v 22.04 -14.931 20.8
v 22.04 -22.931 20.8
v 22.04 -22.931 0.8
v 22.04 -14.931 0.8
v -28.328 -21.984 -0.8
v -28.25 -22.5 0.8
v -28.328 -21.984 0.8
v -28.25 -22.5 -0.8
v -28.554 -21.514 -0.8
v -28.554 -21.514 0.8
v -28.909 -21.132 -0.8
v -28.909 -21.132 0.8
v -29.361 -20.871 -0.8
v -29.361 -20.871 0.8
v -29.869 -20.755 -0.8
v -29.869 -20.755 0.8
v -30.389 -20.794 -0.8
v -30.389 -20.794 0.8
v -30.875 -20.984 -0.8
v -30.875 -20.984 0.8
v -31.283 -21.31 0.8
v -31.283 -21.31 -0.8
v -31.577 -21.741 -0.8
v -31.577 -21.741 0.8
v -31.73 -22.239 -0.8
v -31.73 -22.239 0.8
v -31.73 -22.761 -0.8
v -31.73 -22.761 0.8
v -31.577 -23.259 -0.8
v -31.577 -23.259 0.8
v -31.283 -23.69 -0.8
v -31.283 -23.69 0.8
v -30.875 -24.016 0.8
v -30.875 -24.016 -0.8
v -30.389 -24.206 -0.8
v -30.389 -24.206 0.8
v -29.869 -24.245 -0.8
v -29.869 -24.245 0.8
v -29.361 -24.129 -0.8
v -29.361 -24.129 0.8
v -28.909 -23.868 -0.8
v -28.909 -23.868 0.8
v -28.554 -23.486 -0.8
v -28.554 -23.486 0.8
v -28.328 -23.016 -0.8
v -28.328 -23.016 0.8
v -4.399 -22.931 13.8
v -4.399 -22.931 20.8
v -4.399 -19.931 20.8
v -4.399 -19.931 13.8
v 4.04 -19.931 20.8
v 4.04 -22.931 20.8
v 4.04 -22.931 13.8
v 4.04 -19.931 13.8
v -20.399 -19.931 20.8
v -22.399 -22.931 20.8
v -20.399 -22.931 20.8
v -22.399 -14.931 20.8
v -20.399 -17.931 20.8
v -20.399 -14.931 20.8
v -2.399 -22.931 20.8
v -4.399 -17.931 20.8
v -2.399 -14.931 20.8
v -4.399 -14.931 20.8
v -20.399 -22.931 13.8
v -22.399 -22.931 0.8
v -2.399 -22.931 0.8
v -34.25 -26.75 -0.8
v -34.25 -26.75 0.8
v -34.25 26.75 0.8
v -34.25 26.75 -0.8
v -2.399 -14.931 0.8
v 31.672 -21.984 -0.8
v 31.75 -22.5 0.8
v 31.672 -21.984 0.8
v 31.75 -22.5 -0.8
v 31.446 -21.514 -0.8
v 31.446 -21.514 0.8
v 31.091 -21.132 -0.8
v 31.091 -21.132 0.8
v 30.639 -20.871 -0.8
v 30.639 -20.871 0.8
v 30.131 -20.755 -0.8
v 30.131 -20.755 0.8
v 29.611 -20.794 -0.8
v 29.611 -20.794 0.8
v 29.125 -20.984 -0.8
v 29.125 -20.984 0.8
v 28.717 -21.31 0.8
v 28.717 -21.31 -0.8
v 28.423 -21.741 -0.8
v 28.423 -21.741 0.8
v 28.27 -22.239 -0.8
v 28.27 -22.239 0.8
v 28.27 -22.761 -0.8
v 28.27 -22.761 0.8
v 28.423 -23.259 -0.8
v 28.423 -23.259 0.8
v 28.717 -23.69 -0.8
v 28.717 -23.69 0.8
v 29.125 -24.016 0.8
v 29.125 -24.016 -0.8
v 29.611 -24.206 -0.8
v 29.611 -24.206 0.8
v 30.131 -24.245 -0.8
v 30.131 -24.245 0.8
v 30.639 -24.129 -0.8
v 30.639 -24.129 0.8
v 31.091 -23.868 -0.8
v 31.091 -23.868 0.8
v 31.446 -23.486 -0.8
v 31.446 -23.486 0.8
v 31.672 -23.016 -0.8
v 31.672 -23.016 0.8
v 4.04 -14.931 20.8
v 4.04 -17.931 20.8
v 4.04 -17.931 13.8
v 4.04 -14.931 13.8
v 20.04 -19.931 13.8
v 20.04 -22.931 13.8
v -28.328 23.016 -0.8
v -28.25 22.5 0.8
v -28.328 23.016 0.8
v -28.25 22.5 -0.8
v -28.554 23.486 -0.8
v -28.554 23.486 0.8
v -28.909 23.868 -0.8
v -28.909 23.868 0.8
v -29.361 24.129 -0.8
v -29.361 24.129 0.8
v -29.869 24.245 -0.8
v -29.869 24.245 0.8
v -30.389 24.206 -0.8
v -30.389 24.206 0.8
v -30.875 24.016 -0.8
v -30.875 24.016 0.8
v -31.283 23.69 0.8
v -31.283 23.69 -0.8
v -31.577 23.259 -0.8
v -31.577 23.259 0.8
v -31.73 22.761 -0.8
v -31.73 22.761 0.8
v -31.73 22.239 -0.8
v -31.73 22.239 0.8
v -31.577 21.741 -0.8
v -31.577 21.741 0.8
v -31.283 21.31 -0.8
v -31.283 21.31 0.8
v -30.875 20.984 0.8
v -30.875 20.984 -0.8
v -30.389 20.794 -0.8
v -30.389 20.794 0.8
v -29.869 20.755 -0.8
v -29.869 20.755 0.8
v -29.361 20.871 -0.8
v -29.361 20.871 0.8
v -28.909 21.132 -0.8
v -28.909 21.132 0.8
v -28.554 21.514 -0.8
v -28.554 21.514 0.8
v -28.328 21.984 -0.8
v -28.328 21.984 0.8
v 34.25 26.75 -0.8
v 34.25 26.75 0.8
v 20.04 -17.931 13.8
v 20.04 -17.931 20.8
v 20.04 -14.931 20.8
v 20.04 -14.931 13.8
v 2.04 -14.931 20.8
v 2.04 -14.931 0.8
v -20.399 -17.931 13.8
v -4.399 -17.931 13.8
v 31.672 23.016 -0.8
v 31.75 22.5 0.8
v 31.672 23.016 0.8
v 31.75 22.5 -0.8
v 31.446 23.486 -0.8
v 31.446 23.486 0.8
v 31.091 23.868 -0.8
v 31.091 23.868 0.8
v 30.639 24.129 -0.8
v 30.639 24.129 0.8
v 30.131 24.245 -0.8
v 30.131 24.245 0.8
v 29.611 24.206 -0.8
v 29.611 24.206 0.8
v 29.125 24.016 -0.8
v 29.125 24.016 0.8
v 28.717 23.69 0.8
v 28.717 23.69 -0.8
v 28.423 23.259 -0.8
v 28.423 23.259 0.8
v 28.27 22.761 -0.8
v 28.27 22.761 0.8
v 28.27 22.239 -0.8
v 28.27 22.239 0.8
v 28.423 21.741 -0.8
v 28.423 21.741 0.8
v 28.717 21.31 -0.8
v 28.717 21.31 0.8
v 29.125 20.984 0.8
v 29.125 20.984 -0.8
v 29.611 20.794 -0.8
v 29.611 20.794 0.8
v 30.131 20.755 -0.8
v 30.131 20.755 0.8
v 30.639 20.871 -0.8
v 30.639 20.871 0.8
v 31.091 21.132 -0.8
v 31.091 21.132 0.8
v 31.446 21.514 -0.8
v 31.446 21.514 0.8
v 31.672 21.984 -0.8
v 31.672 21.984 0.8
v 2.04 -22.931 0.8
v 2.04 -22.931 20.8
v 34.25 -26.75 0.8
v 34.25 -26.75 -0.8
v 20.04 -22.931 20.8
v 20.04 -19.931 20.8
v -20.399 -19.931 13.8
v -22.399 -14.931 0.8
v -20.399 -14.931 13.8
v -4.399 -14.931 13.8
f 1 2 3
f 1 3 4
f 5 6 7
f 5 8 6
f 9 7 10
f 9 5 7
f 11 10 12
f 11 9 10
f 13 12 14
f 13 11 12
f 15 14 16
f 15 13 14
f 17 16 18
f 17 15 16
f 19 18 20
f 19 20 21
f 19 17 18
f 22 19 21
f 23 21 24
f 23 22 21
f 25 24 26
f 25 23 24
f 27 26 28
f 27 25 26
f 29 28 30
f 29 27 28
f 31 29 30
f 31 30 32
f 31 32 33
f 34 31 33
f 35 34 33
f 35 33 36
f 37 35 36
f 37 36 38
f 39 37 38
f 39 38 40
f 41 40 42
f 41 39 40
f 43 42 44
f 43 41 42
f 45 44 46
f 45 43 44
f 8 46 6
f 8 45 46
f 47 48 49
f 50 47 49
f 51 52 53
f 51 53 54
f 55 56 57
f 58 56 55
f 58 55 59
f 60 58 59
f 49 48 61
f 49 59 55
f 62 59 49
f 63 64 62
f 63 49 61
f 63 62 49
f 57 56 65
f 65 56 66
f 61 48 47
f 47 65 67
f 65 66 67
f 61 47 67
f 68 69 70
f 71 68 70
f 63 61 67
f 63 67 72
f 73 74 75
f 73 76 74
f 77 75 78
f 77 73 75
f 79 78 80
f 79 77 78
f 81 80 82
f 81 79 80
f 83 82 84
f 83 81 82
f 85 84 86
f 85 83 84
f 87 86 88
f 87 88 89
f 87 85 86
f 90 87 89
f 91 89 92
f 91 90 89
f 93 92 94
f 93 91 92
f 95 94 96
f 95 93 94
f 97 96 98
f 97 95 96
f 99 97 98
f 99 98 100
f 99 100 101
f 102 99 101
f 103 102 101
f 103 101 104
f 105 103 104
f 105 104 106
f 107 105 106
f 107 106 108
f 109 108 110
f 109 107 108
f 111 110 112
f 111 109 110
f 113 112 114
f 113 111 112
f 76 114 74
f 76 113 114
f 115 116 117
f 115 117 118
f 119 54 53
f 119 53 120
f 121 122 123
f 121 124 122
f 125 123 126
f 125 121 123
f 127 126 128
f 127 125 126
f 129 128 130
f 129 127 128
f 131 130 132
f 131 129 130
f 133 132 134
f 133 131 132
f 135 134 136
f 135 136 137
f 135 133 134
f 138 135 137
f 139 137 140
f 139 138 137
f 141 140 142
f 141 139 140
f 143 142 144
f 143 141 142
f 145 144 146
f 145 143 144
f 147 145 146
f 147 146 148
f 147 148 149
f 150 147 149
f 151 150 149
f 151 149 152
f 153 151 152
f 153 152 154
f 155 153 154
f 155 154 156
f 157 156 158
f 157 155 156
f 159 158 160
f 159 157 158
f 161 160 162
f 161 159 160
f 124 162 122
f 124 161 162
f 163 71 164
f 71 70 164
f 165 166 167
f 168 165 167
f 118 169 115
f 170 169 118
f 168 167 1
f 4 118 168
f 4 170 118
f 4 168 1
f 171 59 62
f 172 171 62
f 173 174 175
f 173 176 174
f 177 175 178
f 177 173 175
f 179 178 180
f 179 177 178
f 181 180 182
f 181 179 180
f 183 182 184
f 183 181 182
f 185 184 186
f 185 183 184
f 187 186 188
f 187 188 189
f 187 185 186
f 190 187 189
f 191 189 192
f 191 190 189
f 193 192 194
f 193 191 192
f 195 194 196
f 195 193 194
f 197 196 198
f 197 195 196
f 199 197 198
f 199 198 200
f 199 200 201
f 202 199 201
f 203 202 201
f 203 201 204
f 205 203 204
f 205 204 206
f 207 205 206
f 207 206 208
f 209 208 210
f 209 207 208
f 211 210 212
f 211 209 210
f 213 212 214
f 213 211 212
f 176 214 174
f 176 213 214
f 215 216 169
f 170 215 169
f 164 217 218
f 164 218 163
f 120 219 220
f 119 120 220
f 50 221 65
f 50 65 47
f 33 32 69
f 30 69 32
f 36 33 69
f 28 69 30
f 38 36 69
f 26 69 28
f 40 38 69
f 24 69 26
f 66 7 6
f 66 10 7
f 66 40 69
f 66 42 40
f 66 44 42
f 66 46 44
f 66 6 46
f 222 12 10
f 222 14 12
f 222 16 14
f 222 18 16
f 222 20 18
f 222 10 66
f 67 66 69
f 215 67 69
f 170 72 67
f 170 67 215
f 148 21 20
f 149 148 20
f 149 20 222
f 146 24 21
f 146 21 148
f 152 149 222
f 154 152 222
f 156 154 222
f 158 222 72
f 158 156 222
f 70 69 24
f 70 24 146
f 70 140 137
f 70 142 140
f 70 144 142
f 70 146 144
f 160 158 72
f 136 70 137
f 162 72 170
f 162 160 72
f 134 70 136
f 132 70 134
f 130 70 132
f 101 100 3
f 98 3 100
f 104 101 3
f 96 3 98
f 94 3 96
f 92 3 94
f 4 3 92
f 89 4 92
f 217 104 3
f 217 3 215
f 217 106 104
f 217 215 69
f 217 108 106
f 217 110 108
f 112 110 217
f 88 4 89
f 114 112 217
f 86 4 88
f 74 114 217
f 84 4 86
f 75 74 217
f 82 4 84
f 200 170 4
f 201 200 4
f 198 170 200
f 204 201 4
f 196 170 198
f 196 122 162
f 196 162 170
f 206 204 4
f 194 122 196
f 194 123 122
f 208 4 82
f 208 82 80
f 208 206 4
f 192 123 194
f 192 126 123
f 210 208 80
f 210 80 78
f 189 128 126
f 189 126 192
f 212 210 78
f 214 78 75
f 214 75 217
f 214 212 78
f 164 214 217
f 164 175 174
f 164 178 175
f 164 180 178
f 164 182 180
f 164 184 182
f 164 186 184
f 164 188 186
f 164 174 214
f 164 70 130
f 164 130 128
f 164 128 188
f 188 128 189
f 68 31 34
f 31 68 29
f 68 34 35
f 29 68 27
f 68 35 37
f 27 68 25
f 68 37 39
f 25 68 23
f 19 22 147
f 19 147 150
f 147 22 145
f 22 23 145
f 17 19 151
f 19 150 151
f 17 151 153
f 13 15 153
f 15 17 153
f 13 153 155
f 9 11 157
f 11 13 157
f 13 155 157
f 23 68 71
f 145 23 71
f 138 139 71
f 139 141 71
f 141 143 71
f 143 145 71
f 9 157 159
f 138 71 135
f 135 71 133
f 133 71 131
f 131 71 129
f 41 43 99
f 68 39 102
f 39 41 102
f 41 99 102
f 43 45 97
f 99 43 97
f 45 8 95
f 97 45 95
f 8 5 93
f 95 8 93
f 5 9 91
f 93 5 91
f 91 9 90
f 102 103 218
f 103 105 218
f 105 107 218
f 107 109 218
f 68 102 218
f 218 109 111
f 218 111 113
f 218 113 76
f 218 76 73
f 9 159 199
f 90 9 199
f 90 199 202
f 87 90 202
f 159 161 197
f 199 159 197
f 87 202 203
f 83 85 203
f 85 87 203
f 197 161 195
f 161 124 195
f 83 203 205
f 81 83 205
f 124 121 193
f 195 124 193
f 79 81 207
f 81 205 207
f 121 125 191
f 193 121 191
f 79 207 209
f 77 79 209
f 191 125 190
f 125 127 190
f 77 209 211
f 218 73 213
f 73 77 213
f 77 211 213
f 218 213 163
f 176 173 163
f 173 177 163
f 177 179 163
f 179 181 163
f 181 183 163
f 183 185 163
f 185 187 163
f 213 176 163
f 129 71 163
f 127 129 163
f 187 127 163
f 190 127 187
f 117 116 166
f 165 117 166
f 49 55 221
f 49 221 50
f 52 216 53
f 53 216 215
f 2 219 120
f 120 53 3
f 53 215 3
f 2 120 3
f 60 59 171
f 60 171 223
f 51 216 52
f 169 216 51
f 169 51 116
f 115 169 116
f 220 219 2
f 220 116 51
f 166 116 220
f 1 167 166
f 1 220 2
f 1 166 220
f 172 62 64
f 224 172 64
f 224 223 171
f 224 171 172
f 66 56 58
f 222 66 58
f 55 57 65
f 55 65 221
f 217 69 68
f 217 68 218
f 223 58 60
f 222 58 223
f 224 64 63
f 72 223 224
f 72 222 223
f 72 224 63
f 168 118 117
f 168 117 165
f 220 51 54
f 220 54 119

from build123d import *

# Parameters (mm, degrees)
SKETCH1_W           = 68.5
SKETCH1_H           = 53.5
SKETCH1_R           = 1.75
BOSS_EXTRUDE1_DEPTH = 0.8
SKETCH2_W           = 20
SKETCH2_H           = 8
BOSS_EXTRUDE2_DEPTH = 20
SKETCH3_W           = 16
SKETCH3_H           = 3
CUT_EXTRUDE1_DEPTH  = 7


with BuildPart() as part:
    # Sketch1 → Boss-Extrude1 (new body, symmetric)
    with BuildSketch(Plane.XY):
        Rectangle(SKETCH1_W, SKETCH1_H)
        with Locations((-30, 22.5)):
            Circle(SKETCH1_R, mode=Mode.SUBTRACT)
        with Locations((30, 22.5)):
            Circle(SKETCH1_R, mode=Mode.SUBTRACT)
        with Locations((-30, -22.5)):
            Circle(SKETCH1_R, mode=Mode.SUBTRACT)
        with Locations((30, -22.5)):
            Circle(SKETCH1_R, mode=Mode.SUBTRACT)
    extrude(amount=BOSS_EXTRUDE1_DEPTH, both=True)

    # Sketch2 → Boss-Extrude2 (add)
    with BuildSketch(Plane.XY.offset(0.8)):
        with Locations((-12.399398806, -18.931036611)):
            Rectangle(SKETCH2_W, SKETCH2_H)
        with Locations((12.039766375, -18.931036611)):
            Rectangle(SKETCH2_W, SKETCH2_H)
    extrude(amount=BOSS_EXTRUDE2_DEPTH)

    # Sketch3 → Cut-Extrude1 (cut)
    with BuildSketch(Plane.XY.offset(20.8)):
        with Locations((-12.399398806, -16.431036611)):
            Rectangle(SKETCH3_W, SKETCH3_H)
        with Locations((-12.399398806, -21.431036611)):
            Rectangle(SKETCH3_W, SKETCH3_H)
        with Locations((12.039766375, -16.431036611)):
            Rectangle(SKETCH3_W, SKETCH3_H)
        with Locations((12.039766375, -21.431036611)):
            Rectangle(SKETCH3_W, SKETCH3_H)
    extrude(amount=-CUT_EXTRUDE1_DEPTH, mode=Mode.SUBTRACT)


solid = part.part
